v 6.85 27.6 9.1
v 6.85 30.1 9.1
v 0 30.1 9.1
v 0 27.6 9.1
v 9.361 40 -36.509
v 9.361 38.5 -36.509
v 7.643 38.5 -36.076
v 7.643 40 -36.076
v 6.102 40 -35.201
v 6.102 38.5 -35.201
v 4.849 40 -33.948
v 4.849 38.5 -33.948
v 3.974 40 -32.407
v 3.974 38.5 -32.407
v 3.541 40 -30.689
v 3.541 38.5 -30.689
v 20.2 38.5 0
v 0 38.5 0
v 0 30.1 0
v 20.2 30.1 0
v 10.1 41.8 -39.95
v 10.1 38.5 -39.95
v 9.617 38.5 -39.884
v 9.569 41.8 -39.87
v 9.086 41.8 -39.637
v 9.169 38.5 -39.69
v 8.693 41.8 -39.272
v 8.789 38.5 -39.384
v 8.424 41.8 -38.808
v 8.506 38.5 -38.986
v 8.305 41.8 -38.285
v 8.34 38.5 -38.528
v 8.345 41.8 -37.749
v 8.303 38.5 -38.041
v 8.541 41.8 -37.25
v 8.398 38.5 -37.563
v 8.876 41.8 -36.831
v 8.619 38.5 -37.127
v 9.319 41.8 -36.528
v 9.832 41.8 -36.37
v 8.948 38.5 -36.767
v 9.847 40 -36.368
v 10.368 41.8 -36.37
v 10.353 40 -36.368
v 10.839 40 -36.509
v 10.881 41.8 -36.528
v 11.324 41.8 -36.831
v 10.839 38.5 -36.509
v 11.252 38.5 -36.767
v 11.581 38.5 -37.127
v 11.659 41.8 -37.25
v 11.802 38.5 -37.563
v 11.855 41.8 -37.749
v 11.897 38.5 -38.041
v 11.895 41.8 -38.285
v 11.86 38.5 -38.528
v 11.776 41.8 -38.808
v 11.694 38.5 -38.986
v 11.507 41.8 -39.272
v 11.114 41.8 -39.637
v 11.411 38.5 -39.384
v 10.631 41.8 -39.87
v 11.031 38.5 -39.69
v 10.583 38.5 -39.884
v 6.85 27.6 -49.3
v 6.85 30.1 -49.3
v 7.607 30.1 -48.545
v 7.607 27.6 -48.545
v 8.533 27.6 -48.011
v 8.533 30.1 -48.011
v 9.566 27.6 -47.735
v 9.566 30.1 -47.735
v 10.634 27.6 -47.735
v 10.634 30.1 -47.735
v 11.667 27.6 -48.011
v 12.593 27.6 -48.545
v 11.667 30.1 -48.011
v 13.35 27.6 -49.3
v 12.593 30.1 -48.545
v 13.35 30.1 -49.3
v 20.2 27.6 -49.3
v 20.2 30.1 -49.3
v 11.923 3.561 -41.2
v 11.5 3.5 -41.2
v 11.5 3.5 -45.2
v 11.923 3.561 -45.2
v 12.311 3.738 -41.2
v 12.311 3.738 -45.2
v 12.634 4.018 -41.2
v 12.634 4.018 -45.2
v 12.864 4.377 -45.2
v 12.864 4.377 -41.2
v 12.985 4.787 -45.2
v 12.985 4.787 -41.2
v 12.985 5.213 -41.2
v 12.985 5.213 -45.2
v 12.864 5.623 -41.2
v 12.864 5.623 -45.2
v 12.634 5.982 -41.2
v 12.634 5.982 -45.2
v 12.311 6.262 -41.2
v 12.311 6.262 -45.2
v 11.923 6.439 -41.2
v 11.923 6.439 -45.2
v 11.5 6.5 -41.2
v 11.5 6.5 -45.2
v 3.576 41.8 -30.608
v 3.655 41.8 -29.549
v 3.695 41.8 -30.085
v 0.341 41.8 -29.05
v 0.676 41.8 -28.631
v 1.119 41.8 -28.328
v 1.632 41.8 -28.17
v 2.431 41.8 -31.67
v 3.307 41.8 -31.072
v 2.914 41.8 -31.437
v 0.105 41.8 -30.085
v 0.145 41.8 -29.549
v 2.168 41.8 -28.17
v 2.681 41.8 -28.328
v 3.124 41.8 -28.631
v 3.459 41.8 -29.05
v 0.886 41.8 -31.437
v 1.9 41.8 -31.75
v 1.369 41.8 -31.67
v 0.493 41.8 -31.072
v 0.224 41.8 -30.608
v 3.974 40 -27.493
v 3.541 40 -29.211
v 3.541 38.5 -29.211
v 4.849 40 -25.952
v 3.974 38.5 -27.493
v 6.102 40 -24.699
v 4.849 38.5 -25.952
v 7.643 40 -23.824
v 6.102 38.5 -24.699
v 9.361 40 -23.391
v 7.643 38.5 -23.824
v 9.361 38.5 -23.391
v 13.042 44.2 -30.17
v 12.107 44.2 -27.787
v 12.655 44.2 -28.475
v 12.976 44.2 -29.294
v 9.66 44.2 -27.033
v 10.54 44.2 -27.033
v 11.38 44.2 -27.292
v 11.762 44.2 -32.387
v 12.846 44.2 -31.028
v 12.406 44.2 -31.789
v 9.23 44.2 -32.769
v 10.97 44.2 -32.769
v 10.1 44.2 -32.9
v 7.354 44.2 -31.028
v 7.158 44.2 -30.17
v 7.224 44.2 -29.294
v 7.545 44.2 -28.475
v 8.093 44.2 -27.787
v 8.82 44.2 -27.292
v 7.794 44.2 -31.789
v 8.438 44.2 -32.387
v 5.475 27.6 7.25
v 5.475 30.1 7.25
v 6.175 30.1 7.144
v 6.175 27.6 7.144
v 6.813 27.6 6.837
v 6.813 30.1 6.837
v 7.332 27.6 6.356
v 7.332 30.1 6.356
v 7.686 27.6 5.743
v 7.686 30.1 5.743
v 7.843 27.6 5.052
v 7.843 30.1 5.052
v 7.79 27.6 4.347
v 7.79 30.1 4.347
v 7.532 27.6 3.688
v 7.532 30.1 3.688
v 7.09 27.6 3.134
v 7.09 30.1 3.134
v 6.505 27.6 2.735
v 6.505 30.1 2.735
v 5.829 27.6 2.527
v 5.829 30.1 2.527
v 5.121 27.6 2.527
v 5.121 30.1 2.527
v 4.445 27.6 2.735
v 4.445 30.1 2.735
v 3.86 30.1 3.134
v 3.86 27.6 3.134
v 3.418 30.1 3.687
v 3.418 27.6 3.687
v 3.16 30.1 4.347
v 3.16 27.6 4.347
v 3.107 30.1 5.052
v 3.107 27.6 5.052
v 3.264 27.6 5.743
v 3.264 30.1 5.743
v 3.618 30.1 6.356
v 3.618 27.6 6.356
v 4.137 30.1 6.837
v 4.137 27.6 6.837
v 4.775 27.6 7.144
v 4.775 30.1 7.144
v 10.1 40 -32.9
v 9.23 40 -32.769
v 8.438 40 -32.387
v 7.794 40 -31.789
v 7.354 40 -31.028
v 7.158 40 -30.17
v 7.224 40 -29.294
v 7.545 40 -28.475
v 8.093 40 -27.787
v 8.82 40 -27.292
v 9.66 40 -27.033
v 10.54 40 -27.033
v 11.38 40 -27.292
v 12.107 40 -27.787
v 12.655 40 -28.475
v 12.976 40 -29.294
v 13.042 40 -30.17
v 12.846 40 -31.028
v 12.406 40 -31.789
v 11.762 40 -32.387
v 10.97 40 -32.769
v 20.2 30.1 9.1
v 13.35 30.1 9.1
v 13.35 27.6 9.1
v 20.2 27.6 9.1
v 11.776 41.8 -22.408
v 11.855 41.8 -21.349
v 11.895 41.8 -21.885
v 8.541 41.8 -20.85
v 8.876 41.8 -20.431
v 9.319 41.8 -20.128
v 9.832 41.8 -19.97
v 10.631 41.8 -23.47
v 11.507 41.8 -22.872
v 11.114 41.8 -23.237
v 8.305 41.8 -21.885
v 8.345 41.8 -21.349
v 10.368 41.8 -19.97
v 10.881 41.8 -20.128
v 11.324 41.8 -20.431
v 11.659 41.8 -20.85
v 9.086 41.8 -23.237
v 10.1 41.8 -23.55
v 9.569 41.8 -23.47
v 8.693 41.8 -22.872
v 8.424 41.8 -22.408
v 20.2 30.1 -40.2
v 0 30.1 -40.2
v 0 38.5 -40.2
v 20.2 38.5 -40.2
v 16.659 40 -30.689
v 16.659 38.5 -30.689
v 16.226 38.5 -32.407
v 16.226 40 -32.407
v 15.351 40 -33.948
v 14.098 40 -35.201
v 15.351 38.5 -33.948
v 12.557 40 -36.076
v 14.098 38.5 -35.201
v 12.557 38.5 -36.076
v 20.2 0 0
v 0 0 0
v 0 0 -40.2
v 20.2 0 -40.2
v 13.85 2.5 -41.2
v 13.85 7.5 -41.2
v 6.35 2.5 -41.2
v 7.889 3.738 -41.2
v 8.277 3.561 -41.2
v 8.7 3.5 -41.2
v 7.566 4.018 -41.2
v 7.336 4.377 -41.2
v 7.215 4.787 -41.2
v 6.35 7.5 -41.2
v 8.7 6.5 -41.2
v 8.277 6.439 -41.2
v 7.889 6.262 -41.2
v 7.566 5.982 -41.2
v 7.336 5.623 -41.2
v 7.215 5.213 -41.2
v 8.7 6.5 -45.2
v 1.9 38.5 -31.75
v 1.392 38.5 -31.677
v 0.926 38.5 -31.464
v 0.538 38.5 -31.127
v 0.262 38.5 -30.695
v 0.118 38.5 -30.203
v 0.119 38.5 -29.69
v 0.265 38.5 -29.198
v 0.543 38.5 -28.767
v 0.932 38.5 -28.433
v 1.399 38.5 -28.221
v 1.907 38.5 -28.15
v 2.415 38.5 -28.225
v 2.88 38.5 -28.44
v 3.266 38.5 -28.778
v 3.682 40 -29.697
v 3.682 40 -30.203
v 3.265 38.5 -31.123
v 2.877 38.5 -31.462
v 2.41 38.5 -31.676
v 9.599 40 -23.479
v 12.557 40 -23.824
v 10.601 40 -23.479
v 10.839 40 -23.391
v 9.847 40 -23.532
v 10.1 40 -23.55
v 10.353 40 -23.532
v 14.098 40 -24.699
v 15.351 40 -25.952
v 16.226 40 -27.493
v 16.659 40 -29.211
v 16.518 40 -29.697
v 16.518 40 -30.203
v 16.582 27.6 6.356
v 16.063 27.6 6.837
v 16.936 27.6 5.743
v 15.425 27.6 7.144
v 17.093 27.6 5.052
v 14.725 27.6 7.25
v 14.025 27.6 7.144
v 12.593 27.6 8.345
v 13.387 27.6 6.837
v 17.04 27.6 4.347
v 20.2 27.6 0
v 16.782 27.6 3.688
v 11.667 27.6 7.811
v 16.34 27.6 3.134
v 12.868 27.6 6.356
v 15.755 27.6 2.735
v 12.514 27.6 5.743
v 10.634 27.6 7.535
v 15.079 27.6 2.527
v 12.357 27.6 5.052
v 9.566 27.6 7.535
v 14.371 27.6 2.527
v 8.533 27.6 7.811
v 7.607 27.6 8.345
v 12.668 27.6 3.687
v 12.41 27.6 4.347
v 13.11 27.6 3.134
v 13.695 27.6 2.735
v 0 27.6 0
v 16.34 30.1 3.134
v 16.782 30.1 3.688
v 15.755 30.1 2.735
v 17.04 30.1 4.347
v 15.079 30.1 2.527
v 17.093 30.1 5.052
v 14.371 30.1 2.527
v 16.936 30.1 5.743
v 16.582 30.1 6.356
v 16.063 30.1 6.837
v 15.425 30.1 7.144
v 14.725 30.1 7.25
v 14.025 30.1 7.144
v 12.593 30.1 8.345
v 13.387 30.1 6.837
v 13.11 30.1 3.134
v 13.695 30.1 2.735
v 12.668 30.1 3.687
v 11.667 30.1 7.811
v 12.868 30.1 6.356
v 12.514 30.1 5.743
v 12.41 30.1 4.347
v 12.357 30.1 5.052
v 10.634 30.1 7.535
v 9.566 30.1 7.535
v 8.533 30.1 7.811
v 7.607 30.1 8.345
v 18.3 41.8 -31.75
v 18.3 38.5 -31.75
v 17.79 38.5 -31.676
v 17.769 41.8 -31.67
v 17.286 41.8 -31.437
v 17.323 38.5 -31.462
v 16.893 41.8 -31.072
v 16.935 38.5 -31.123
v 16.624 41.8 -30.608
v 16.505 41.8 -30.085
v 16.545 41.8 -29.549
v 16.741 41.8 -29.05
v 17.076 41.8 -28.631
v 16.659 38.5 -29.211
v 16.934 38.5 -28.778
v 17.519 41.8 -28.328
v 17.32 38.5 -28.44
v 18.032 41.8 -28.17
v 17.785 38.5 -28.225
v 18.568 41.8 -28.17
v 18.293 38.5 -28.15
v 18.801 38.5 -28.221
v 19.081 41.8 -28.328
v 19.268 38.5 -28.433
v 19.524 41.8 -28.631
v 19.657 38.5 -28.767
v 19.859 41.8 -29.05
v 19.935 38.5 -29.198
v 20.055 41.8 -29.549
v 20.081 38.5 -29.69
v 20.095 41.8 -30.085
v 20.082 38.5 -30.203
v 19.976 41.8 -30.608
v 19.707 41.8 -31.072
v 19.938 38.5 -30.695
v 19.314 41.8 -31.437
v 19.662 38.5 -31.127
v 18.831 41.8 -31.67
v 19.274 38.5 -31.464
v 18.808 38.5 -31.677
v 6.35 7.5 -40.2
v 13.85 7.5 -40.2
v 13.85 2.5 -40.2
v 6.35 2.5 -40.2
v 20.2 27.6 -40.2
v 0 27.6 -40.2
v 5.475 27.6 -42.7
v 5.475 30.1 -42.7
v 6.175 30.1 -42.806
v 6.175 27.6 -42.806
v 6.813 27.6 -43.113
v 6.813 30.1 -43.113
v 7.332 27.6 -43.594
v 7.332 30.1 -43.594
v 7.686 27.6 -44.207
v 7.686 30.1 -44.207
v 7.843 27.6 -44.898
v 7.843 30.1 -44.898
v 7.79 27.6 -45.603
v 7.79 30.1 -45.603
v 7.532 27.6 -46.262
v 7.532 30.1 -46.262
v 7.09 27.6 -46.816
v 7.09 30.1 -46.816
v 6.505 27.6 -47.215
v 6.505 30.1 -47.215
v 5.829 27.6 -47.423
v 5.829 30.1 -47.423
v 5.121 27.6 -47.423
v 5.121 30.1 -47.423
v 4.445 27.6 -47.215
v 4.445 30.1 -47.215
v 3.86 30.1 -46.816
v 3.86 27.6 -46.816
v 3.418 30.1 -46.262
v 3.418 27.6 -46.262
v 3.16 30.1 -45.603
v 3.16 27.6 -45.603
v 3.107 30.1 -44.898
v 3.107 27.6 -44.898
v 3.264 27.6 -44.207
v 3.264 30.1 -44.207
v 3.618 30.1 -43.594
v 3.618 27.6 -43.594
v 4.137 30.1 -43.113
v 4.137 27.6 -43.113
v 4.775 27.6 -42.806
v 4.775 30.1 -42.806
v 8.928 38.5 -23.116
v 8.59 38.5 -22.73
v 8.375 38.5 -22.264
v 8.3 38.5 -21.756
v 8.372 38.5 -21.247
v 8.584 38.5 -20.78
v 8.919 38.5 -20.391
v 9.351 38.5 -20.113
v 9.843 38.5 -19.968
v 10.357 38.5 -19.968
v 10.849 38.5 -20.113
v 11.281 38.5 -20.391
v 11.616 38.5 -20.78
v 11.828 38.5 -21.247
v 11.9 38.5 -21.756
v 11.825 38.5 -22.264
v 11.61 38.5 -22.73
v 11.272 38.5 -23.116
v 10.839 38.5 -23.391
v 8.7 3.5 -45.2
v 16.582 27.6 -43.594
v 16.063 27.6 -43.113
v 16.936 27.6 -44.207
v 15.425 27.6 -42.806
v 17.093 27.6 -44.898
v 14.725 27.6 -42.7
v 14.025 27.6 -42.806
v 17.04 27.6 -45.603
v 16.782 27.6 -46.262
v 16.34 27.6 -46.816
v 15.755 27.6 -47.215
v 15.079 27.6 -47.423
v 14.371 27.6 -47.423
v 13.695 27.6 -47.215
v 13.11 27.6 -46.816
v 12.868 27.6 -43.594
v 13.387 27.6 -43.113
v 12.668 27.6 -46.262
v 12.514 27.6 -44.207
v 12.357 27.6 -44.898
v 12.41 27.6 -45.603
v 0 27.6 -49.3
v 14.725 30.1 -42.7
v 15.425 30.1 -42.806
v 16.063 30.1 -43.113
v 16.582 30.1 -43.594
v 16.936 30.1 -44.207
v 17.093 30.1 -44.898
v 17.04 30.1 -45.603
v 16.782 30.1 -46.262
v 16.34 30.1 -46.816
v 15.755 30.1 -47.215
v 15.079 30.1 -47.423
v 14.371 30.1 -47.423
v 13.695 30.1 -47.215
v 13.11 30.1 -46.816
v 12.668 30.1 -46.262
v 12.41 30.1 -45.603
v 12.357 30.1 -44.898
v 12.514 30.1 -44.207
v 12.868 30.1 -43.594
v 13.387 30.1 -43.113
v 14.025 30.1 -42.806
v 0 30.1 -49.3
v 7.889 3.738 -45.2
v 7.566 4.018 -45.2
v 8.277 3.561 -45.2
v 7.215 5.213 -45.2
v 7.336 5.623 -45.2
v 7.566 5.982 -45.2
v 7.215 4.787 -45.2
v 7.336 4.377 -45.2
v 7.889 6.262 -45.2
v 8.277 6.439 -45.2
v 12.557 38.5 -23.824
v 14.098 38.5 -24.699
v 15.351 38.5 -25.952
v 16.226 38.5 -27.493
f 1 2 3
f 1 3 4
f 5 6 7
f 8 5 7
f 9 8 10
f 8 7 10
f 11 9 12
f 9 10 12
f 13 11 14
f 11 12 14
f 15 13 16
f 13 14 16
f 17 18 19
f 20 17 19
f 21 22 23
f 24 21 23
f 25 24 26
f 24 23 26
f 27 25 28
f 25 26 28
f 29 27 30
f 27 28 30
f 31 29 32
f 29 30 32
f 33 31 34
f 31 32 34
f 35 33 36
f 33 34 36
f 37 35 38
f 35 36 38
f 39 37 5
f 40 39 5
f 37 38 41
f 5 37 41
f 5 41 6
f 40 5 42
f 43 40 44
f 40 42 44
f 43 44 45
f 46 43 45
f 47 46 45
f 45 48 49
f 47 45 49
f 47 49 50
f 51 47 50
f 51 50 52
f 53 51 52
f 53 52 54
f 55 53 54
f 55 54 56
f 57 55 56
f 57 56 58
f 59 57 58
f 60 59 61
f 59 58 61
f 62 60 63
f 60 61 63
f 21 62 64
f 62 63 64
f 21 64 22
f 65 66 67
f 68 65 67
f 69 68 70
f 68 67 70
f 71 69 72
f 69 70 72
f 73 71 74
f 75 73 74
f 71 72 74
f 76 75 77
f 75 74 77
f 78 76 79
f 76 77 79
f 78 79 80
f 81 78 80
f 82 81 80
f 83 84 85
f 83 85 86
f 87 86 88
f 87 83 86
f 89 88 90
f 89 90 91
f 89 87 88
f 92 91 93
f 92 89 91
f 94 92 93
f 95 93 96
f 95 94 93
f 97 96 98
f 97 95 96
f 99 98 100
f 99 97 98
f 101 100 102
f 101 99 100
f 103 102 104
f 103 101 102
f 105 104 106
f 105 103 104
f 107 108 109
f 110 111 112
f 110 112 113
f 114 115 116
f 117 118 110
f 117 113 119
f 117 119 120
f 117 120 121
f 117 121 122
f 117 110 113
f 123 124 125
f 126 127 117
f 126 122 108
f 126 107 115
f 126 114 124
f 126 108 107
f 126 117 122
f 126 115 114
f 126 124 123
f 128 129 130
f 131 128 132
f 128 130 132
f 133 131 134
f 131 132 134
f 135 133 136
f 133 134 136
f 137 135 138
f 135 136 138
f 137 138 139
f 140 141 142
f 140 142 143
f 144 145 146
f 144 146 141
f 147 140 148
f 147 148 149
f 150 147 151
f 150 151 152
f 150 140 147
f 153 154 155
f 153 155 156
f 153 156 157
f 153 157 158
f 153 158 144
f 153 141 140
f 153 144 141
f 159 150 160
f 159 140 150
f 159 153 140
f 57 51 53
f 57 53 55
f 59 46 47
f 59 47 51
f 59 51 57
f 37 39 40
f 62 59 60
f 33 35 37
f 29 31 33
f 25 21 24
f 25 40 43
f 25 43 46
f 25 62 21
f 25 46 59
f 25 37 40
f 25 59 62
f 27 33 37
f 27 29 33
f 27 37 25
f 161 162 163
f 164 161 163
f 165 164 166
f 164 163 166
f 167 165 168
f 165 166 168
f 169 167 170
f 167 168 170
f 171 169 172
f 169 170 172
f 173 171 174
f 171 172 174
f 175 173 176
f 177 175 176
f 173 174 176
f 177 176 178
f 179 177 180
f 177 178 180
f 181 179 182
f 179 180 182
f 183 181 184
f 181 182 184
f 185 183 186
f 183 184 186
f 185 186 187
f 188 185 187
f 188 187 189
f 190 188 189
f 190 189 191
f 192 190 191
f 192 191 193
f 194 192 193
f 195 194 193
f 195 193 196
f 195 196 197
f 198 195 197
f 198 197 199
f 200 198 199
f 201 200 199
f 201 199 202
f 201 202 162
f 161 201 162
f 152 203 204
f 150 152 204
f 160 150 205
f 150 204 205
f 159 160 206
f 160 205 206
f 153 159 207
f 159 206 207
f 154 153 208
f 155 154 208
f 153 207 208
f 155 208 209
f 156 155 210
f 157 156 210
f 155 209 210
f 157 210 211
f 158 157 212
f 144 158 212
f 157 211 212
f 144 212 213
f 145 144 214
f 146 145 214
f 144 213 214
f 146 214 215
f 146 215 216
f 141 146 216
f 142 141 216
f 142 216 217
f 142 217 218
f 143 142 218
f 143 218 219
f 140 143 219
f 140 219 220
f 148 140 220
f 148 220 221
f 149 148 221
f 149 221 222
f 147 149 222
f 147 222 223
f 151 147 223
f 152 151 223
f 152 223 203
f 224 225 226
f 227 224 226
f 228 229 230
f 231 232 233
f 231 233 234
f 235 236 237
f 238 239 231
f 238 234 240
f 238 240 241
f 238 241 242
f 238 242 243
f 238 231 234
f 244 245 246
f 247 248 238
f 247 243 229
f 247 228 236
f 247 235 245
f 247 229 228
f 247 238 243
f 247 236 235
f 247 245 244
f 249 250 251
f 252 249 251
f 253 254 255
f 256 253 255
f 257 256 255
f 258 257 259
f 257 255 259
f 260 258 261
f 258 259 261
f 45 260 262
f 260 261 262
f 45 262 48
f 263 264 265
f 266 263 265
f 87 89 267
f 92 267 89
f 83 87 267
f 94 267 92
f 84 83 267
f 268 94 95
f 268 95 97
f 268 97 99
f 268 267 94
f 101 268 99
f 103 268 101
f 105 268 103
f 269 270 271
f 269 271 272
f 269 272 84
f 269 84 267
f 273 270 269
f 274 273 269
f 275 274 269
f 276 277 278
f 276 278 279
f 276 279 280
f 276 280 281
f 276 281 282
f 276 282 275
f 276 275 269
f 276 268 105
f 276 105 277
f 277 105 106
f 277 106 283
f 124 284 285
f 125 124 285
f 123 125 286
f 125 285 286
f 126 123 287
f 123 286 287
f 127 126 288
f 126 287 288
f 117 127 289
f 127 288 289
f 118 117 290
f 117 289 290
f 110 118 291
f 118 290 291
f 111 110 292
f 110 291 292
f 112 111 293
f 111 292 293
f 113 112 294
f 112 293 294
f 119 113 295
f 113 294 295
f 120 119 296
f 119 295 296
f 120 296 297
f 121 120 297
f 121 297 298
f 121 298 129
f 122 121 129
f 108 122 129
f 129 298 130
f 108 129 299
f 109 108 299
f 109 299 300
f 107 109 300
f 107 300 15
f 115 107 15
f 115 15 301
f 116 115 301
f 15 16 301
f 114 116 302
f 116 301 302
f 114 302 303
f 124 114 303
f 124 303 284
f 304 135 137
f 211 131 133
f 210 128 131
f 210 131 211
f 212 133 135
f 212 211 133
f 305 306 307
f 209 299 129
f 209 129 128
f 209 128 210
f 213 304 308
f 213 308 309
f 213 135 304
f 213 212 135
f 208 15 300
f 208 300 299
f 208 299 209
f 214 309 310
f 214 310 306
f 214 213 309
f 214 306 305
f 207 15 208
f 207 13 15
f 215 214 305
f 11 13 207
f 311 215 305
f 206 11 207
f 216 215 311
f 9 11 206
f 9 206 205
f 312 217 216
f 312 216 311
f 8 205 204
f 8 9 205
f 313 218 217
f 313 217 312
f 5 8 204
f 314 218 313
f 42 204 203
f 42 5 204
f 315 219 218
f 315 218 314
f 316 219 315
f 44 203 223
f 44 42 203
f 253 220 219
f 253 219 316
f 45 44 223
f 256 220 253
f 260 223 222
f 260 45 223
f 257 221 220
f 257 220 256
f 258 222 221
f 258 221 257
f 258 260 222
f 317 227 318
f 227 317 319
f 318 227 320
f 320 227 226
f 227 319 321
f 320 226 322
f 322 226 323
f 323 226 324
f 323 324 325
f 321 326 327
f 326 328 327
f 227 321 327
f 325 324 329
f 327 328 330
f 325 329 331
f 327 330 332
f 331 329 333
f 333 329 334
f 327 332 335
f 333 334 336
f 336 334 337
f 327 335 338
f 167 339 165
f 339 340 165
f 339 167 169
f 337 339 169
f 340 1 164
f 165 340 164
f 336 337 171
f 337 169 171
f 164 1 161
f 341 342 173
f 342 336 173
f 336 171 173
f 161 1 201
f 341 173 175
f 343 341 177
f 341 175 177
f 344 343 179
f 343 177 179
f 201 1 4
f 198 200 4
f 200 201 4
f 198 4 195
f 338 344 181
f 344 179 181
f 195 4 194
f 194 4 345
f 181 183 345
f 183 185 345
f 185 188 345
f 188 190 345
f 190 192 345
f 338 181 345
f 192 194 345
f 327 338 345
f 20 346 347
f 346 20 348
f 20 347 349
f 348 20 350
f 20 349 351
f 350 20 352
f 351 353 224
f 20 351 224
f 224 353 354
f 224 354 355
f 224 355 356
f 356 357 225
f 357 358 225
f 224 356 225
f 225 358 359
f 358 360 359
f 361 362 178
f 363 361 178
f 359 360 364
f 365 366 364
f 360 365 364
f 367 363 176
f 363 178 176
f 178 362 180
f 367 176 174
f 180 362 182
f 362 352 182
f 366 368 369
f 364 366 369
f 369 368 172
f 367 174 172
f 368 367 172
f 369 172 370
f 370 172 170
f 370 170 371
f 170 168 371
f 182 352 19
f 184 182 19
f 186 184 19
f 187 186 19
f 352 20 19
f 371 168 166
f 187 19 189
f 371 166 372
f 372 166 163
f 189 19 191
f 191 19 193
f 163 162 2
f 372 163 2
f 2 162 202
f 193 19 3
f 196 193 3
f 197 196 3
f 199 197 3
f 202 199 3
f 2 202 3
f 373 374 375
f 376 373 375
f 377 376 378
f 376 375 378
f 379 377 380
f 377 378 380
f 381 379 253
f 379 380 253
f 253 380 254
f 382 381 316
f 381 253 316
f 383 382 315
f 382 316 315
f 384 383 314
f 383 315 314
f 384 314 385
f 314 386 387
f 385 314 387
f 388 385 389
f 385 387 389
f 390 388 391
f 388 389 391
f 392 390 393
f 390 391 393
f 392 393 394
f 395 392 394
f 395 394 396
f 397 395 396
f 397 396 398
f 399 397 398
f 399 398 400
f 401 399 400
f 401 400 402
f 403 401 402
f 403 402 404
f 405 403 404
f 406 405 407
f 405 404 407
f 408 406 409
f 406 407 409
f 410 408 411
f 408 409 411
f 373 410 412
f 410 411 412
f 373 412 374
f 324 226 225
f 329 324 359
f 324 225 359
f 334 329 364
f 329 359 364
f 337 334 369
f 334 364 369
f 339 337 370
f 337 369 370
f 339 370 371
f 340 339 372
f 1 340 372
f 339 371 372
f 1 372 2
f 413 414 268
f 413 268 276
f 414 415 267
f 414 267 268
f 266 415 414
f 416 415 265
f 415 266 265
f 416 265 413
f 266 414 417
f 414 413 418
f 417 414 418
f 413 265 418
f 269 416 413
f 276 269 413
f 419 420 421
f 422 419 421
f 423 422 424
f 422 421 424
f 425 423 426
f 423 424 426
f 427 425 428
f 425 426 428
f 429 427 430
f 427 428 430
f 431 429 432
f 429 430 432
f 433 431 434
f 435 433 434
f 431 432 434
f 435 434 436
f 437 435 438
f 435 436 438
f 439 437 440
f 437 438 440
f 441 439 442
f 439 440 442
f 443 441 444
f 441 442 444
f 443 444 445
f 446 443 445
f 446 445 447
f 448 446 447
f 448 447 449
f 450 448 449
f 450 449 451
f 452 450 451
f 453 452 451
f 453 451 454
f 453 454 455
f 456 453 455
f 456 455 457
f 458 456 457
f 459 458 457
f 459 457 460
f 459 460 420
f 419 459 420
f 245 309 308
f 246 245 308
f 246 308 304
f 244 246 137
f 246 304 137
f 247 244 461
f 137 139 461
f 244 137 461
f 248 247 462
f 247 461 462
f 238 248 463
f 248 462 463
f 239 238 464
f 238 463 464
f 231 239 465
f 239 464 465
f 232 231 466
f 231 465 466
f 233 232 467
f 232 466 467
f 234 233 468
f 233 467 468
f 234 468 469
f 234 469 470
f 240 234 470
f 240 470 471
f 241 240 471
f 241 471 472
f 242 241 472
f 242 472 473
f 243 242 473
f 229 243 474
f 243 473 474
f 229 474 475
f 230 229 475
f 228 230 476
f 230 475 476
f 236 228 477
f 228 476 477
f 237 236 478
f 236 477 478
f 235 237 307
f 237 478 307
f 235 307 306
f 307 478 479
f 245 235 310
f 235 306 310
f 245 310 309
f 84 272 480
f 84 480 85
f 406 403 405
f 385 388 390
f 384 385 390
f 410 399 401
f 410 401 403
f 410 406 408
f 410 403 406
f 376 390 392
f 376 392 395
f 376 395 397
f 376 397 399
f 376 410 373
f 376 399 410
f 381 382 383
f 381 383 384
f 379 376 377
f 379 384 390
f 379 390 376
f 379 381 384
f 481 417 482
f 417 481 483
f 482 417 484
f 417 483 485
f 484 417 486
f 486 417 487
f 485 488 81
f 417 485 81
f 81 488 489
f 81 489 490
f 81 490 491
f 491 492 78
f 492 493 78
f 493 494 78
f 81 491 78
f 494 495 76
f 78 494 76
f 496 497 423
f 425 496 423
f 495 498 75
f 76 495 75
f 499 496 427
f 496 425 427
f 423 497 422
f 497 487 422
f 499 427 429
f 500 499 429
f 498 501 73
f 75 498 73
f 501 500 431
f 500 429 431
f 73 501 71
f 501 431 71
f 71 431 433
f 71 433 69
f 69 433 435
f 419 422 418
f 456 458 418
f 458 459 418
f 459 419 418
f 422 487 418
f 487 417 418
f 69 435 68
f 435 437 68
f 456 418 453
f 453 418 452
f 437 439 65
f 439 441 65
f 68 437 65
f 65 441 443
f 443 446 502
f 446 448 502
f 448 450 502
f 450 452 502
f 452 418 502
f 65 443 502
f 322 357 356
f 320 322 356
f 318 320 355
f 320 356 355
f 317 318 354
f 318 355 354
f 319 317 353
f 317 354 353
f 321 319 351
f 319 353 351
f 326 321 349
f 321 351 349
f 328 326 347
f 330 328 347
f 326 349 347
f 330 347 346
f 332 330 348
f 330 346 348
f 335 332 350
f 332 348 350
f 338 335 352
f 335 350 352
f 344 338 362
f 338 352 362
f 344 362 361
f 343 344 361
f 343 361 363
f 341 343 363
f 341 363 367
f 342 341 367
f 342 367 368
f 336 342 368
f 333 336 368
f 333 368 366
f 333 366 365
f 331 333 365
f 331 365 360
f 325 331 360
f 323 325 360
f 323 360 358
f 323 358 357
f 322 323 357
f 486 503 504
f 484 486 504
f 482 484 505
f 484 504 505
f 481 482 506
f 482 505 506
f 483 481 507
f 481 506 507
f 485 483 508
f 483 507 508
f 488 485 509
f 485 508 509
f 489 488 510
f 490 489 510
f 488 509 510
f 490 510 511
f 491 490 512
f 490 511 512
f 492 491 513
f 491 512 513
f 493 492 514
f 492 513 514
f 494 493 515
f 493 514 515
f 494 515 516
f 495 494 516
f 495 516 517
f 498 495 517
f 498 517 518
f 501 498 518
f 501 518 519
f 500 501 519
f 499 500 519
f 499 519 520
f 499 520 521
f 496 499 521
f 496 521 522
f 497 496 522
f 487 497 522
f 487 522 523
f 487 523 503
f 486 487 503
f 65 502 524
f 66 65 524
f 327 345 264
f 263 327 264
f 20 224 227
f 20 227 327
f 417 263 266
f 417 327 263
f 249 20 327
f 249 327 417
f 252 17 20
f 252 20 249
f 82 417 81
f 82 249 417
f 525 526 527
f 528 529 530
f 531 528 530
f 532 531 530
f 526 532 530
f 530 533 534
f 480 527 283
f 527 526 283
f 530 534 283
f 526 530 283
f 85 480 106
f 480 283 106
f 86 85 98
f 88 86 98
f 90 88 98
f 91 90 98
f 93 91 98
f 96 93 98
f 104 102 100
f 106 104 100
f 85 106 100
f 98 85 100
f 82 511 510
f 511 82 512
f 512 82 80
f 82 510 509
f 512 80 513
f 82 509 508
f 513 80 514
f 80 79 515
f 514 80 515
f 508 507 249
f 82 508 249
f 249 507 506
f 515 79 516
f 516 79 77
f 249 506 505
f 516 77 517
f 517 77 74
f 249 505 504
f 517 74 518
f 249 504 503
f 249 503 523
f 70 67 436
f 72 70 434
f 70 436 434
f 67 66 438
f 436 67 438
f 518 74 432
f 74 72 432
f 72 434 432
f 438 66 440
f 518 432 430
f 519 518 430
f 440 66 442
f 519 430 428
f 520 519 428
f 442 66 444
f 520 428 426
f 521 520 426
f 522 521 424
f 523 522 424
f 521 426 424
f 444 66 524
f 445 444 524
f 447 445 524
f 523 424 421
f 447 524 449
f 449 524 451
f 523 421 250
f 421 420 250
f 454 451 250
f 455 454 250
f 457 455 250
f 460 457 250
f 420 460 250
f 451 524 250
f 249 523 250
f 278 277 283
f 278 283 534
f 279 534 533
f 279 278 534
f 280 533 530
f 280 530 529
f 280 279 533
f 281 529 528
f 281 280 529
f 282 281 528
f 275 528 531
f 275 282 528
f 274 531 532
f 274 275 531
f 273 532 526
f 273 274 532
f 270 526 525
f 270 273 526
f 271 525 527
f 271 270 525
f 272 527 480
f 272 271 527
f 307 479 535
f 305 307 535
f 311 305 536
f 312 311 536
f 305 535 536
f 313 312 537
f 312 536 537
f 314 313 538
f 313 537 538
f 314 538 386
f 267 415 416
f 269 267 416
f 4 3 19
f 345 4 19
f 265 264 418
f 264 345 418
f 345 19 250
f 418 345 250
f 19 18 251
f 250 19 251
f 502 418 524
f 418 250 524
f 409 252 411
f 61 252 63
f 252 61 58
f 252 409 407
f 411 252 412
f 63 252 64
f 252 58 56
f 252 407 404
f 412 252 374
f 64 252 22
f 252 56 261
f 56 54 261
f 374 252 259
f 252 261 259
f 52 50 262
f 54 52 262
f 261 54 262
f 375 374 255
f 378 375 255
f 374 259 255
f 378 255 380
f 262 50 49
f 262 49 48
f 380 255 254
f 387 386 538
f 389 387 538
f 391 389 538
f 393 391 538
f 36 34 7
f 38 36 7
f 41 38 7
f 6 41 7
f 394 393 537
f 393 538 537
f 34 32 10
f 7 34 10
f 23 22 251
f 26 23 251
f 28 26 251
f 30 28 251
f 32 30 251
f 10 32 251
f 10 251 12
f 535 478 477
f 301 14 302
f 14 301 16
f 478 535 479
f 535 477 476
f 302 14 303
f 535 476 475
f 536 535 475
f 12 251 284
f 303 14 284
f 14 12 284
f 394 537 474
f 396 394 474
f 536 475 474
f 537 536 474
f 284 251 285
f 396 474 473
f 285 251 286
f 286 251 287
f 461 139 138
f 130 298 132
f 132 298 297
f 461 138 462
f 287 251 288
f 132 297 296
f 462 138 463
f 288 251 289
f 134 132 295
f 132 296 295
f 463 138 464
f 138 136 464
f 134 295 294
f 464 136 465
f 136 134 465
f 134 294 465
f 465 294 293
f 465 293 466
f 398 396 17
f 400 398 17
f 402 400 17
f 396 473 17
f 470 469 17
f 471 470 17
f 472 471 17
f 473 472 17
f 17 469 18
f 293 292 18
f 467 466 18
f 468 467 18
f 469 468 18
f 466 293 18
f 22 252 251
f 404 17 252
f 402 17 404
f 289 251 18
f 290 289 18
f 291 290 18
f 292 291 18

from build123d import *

# Parameters (mm, degrees)
BOSS_EXTRU_1_DEPTH      = 20.2
ESQUISSE2_R             = 4.10078125
ESQUISSE2_R_2           = 2.375
ENL_V_MAT_EXTRU_1_DEPTH = 62.192646617
ESQUISSE3_R             = 2.95
BOSS_EXTRU_2_DEPTH      = 5.7
ESQUISSE4_R             = 1.8
BOSS_EXTRU_3_DEPTH      = 3.3
ESQUISSE5_R             = 6.6
BOSS_EXTRU_4_DEPTH      = 1.5
ESQUISSE6_W             = 7.5
ESQUISSE6_H             = 5
BOSS_EXTRU_5_DEPTH      = 1
BOSS_EXTRU_6_DEPTH      = 4


with BuildPart() as part:
    # Esquisse1 → Boss.-Extru.1 (new body)
    with BuildSketch(Plane(origin=(0, 0, 0), x_dir=(0, 0, -1), z_dir=(1, 0, 0))):
        Polygon((0, 0), (40.2, 0), (40.2, 27.6), (49.3, 27.6), (49.3, 30.1), (40.2, 30.1), (40.2, 38.5), (0, 38.5), (0, 30.1), (-9.1, 30.1), (-9.1, 27.6), (0, 27.6), align=None)
    extrude(amount=BOSS_EXTRU_1_DEPTH)

    # Esquisse2 → Enlèv. mat.-Extru.1 (cut, through all)
    with BuildSketch(Plane(origin=(0, 30.1, 0), x_dir=(1, 0, 0), z_dir=(0, 1, 0))):
        with Locations((10.1, 51.80078125)):
            Circle(ESQUISSE2_R)
        with Locations(Location((5.475, 45.075, 0), (0, 0, 270))):
            Circle(ESQUISSE2_R_2)
        with Locations(Location((14.725, 45.075, 0), (0, 0, 270))):
            Circle(ESQUISSE2_R_2)
        with Locations(Location((14.725, -4.875, 0), (0, 0, 270))):
            Circle(ESQUISSE2_R_2)
        with Locations(Location((5.475, -4.875, 0), (0, 0, 270))):
            Circle(ESQUISSE2_R_2)
        with Locations((10.1, -11.60078125)):
            Circle(ESQUISSE2_R)
    extrude(amount=-ENL_V_MAT_EXTRU_1_DEPTH, mode=Mode.SUBTRACT)

    # Esquisse3 → Boss.-Extru.2 (add)
    with BuildSketch(Plane(origin=(0, 38.5, 0), x_dir=(1, 0, 0), z_dir=(0, 1, 0))):
        with Locations(Location((10.1, 29.95, 0), (0, 0, 90))):
            Circle(ESQUISSE3_R)
    extrude(amount=BOSS_EXTRU_2_DEPTH)

    # Esquisse4 → Boss.-Extru.3 (add)
    with BuildSketch(Plane(origin=(0, 38.5, 0), x_dir=(1, 0, 0), z_dir=(0, 1, 0))):
        with Locations(Location((1.9, 29.95, 0), (0, 0, 90))):
            Circle(ESQUISSE4_R)
        with Locations(Location((10.1, 38.15, 0), (0, 0, 90))):
            Circle(ESQUISSE4_R)
        with Locations(Location((18.3, 29.95, 0), (0, 0, 90))):
            Circle(ESQUISSE4_R)
        with Locations(Location((10.1, 21.75, 0), (0, 0, 90))):
            Circle(ESQUISSE4_R)
    extrude(amount=BOSS_EXTRU_3_DEPTH)

    # Esquisse5 → Boss.-Extru.4 (add)
    with BuildSketch(Plane(origin=(0, 38.5, 0), x_dir=(1, 0, 0), z_dir=(0, 1, 0))):
        with Locations((10.1, 29.95)):
            Circle(ESQUISSE5_R)
    extrude(amount=BOSS_EXTRU_4_DEPTH)

    # Esquisse6 → Boss.-Extru.5 (add)
    with BuildSketch(Plane(origin=(0, 0, -40.2), x_dir=(-1, 0, 0), z_dir=(0, 0, -1))):
        with Locations((-10.1, 5)):
            Rectangle(ESQUISSE6_W, ESQUISSE6_H)
    extrude(amount=BOSS_EXTRU_5_DEPTH)

    # Esquisse7 → Boss.-Extru.6 (add)
    with BuildSketch(Plane(origin=(0, 0, -41.2), x_dir=(-1, 0, 0), z_dir=(0, 0, -1))):
        with BuildLine():
            Line((-11.5, 6.5), (-8.7, 6.5))
            ThreePointArc((-8.7, 6.5), (-7.2, 5), (-8.7, 3.5))
            Line((-8.7, 3.5), (-11.5, 3.5))
            ThreePointArc((-11.5, 3.5), (-13, 5), (-11.5, 6.5))
        make_face()
    extrude(amount=BOSS_EXTRU_6_DEPTH)


solid = part.part
